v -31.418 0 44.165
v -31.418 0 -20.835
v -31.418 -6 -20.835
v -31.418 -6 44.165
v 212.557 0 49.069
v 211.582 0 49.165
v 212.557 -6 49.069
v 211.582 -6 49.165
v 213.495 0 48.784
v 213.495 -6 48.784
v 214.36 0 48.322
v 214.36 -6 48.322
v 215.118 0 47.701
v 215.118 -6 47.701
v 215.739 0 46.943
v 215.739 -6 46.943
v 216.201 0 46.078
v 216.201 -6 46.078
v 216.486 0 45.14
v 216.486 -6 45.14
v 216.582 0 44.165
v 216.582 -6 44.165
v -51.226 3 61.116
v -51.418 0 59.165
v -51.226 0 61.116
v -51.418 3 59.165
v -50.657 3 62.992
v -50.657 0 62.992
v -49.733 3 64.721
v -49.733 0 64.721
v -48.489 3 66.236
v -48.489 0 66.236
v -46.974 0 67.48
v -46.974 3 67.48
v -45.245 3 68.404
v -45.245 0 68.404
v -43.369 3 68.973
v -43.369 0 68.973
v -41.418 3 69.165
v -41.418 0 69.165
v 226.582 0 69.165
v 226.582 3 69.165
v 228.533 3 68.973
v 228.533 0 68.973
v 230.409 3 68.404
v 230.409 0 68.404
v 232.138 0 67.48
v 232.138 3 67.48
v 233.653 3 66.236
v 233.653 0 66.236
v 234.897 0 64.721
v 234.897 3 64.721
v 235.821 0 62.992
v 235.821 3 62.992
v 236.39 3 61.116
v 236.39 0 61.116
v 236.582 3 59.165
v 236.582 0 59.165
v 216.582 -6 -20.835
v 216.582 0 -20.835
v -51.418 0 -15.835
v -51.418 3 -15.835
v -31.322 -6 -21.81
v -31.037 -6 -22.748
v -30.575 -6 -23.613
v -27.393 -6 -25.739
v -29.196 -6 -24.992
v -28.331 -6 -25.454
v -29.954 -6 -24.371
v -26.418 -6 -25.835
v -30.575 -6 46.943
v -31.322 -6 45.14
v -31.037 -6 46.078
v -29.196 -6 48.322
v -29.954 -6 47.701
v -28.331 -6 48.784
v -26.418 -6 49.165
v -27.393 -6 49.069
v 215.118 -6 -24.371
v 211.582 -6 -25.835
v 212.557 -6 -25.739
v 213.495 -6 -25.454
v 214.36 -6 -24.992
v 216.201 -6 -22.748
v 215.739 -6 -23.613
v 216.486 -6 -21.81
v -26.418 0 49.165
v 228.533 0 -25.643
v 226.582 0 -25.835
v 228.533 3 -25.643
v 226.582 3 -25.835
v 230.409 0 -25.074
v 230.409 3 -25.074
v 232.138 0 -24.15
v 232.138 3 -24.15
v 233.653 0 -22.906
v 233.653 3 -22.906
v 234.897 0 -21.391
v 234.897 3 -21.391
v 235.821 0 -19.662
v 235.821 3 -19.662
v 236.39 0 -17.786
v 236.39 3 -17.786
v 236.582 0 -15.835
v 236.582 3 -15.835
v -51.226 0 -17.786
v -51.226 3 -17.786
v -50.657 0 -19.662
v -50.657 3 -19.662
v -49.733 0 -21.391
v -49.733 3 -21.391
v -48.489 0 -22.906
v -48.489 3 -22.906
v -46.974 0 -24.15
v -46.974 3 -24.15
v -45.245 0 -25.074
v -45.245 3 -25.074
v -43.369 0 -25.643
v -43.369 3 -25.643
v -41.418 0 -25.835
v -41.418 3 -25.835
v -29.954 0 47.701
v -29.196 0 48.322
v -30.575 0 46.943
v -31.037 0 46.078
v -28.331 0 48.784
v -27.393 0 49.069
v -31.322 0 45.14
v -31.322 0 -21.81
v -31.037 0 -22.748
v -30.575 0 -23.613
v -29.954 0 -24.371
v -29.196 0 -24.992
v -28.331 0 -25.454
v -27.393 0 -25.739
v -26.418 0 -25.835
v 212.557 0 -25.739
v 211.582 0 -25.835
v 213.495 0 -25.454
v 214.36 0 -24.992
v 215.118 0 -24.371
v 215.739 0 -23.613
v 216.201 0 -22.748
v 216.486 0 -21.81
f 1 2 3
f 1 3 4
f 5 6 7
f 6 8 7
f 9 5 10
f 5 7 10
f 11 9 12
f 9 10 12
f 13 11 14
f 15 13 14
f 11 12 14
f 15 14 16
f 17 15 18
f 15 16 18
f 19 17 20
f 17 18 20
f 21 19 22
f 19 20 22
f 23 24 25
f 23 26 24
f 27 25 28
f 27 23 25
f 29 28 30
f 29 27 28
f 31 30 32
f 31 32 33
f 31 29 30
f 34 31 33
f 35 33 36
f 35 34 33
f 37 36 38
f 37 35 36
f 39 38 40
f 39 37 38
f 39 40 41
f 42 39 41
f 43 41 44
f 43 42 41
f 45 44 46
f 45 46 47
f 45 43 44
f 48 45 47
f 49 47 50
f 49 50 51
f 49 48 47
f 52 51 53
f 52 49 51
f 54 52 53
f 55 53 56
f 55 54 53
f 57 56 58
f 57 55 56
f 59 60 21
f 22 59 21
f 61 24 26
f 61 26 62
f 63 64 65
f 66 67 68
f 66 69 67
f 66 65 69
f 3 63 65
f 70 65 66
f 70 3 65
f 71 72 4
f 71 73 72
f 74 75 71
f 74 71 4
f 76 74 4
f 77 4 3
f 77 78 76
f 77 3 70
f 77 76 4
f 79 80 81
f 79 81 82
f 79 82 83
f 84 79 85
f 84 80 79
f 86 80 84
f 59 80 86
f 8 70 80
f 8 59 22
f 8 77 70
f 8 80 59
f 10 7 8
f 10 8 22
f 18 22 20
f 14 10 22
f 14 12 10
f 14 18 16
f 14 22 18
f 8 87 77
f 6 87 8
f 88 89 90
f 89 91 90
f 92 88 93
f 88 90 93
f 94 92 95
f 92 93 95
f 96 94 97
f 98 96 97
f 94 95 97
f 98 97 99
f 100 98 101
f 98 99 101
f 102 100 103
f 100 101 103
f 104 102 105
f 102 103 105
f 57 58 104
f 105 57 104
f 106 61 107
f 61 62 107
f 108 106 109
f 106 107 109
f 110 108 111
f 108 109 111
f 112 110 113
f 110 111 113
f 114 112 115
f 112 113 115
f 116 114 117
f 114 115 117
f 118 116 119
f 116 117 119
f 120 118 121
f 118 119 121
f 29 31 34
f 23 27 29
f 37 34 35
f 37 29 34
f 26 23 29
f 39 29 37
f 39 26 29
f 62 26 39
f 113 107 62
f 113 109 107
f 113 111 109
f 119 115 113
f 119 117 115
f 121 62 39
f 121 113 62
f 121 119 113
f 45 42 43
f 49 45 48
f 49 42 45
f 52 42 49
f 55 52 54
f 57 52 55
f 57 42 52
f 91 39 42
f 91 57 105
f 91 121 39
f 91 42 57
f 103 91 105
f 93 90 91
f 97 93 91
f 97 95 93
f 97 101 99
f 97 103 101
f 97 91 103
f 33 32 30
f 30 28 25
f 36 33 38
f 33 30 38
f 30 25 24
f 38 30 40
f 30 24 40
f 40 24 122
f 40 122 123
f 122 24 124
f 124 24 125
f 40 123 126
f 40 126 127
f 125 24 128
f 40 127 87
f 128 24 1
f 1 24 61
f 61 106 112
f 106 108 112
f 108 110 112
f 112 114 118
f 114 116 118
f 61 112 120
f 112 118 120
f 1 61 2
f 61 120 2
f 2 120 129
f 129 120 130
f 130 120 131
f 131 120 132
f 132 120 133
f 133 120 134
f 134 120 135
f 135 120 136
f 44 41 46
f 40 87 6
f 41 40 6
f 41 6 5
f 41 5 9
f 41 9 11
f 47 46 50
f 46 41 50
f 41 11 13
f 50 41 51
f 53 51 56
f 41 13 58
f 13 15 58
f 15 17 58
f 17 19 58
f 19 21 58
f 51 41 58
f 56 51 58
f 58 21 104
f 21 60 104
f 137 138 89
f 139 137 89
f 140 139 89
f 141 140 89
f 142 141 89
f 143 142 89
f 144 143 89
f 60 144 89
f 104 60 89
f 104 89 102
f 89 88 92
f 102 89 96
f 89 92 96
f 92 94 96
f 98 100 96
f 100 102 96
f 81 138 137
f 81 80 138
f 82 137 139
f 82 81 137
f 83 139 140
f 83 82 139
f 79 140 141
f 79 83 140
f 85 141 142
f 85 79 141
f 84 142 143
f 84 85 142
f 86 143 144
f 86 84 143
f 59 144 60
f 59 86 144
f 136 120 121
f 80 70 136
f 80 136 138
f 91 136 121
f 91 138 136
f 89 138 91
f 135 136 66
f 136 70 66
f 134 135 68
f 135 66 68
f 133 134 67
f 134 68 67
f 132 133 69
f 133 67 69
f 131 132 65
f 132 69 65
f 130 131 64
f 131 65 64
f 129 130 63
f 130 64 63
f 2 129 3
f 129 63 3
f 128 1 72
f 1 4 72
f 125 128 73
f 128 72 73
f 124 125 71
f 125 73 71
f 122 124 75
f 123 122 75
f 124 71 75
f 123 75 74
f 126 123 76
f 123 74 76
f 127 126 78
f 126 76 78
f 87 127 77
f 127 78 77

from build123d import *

# Parameters (mm, degrees)
SKETCH1_W           = 288
SKETCH1_H           = 95
BOSS_EXTRUDE1_DEPTH = 3
SKETCH2_W           = 248
SKETCH2_H           = 75
BOSS_EXTRUDE2_DEPTH = 6
FILLET1_R           = 10
FILLET2_R           = 5


with BuildPart() as part:
    # Sketch1 → Boss-Extrude1 (new body)
    with BuildSketch(Plane(origin=(0, 0, 0), x_dir=(1, 0, 0), z_dir=(0, 1, 0))):
        with Locations((92.582008252, -21.664979636)):
            Rectangle(SKETCH1_W, SKETCH1_H)
    extrude(amount=BOSS_EXTRUDE1_DEPTH)

    # Sketch2 → Boss-Extrude2 (add)
    with BuildSketch(Plane.XZ):
        with Locations((92.582008252, 11.664979636)):
            Rectangle(SKETCH2_W, SKETCH2_H)
    extrude(amount=BOSS_EXTRUDE2_DEPTH)

    # Fillet1
    fillet1_edges = [part.edges().sort_by_distance(p)[0] for p in [
        (236.582008252, 1.5, -25.835020364),
        (-51.417991748, 1.5, -25.835020364),
        (236.582008252, 1.5, 69.164979636),
        (-51.417991748, 1.5, 69.164979636),
    ]]
    fillet(fillet1_edges, radius=FILLET1_R)

    # Fillet2
    fillet2_edges = [part.edges().sort_by_distance(p)[0] for p in [
        (-31.417991748, -3, 49.164979636),
        (-31.417991748, -3, -25.835020364),
        (216.582008252, -3, -25.835020364),
        (216.582008252, -3, 49.164979636),
    ]]
    fillet(fillet2_edges, radius=FILLET2_R)


solid = part.part
